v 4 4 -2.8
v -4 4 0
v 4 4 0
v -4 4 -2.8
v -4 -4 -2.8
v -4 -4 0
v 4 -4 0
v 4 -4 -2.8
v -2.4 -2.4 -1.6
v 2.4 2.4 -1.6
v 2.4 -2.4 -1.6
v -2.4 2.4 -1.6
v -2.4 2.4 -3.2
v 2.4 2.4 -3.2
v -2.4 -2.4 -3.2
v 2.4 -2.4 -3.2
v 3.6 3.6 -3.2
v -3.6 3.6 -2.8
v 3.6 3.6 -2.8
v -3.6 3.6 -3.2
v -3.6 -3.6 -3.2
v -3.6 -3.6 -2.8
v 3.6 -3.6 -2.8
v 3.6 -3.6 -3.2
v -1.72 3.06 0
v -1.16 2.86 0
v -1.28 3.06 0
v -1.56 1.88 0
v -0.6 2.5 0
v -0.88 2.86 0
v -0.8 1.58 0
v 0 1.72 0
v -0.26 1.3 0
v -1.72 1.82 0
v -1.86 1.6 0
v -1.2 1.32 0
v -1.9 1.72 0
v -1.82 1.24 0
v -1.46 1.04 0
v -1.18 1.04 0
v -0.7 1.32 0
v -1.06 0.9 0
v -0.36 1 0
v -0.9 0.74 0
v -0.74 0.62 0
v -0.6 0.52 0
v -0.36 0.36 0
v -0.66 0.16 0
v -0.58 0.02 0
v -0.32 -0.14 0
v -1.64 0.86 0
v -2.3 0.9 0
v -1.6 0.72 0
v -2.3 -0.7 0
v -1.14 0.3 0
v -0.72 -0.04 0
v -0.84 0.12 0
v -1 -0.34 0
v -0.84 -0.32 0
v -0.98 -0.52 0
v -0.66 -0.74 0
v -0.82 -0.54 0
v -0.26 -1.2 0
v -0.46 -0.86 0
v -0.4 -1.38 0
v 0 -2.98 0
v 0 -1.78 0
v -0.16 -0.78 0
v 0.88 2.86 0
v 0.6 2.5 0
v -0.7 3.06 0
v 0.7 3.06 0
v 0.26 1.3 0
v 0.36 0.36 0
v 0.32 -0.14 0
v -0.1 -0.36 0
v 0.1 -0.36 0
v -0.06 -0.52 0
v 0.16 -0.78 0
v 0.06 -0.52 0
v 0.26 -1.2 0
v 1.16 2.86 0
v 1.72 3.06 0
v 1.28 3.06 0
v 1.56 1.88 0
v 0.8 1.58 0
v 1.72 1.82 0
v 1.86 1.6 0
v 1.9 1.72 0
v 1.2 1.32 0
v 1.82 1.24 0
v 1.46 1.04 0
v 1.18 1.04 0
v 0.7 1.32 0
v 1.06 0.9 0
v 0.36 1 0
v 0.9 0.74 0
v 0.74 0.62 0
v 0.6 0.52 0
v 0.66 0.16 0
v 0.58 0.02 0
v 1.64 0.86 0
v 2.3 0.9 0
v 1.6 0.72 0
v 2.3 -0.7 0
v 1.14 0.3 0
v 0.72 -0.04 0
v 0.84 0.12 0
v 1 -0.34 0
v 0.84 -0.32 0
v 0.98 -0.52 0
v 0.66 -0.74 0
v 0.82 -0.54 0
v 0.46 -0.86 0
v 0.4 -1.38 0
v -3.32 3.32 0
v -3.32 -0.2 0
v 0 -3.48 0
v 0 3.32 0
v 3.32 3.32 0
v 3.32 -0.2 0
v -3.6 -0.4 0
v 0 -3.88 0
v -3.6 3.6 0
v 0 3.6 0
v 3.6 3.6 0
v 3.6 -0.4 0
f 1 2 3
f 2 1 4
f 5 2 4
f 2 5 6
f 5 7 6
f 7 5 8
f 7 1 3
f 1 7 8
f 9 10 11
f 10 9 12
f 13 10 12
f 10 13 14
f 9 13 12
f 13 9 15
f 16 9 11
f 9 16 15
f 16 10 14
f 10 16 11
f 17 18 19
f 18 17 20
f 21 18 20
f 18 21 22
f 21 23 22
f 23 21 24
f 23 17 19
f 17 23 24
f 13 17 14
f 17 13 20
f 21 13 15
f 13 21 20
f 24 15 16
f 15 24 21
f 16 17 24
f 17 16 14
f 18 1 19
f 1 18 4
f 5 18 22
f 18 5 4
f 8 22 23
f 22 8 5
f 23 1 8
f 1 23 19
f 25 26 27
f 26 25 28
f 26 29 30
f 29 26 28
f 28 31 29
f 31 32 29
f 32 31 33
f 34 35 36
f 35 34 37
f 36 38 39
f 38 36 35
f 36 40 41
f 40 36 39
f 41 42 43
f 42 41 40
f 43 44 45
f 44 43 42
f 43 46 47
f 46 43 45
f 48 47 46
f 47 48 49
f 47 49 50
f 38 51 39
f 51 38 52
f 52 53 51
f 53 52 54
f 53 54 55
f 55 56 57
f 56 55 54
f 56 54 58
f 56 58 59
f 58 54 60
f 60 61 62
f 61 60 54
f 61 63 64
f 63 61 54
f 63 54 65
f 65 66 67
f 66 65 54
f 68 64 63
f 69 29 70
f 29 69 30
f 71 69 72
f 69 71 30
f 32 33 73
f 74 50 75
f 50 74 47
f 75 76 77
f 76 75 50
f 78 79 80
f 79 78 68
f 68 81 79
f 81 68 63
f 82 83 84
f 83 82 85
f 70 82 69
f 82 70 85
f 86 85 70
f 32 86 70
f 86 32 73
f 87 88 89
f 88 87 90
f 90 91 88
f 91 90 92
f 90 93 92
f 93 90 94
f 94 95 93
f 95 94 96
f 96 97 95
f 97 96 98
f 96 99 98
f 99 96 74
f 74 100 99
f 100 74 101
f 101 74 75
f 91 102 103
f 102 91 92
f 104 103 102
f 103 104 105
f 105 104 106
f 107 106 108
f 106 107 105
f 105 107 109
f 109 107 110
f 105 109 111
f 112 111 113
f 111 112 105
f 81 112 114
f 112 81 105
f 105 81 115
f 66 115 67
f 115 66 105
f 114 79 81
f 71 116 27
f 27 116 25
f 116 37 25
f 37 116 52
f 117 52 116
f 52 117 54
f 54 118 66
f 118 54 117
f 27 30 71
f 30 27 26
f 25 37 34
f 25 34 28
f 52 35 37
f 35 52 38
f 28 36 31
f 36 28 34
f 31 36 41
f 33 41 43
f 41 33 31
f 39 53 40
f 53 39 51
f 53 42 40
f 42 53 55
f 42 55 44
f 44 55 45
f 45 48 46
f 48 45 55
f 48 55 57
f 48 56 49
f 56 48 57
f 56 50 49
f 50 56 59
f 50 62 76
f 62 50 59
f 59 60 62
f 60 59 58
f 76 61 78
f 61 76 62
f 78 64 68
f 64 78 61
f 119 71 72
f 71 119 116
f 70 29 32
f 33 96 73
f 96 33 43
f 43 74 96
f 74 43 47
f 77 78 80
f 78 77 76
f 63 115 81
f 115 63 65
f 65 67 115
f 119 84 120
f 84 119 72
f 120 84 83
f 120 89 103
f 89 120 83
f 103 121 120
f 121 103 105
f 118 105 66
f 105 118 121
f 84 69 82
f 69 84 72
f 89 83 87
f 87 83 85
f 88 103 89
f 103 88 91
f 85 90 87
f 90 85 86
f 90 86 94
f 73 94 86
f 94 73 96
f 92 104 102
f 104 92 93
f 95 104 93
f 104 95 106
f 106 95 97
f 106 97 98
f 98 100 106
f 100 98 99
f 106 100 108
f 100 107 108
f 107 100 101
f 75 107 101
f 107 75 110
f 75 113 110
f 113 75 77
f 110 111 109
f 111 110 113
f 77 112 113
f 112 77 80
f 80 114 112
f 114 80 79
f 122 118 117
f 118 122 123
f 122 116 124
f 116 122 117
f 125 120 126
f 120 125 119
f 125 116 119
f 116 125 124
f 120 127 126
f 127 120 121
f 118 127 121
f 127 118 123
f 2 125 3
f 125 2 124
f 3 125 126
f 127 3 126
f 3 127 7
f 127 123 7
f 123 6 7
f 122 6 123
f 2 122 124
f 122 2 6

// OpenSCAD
// file: ../p/box5.scad
use <../lib.scad>
function ldraw_lib__box5() = [
// 0 Box with 5 Faces and All Edges
// 0 Name: box5.dat
// 0 Author: James Jessiman
// 0 !LDRAW_ORG Primitive UPDATE 2012-01
// 0 !LICENSE Licensed under CC BY 2.0 and CC BY 4.0 : see CAreadme.txt
// 
// 0 BFC CERTIFY CCW
  [0,"BFC","CERTIFY"],
  [0,"BFC","CCW"],
// 
// 0 !HISTORY 2002-04-03 [sbliss] Modified for BFC compliance
// 0 !HISTORY 2002-04-25 [PTadmin] Official Update 2002-02
// 0 !HISTORY 2007-06-24 [PTadmin] Header formatted for Contributor Agreement
// 0 !HISTORY 2008-07-01 [PTadmin] Official Update 2008-01
// 0 !HISTORY 2012-02-16 [Philo] Changed to CCW
// 0 !HISTORY 2012-03-30 [PTadmin] Official Update 2012-01
// 
// 
// 2 24 1 1 1 -1 1 1
  [2,24,1,1,1,-1,1,1],
// 2 24 -1 1 1 -1 1 -1
  [2,24,-1,1,1,-1,1,-1],
// 2 24 -1 1 -1 1 1 -1
  [2,24,-1,1,-1,1,1,-1],
// 2 24 1 1 -1 1 1 1
  [2,24,1,1,-1,1,1,1],
// 2 24 1 0 1 -1 0 1
  [2,24,1,0,1,-1,0,1],
// 2 24 -1 0 1 -1 0 -1
  [2,24,-1,0,1,-1,0,-1],
// 2 24 -1 0 -1 1 0 -1
  [2,24,-1,0,-1,1,0,-1],
// 2 24 1 0 -1 1 0 1
  [2,24,1,0,-1,1,0,1],
// 2 24 1 0 1 1 1 1
  [2,24,1,0,1,1,1,1],
// 2 24 -1 0 1 -1 1 1
  [2,24,-1,0,1,-1,1,1],
// 2 24 1 0 -1 1 1 -1
  [2,24,1,0,-1,1,1,-1],
// 2 24 -1 0 -1 -1 1 -1
  [2,24,-1,0,-1,-1,1,-1],
// 4 16 -1 1 1 1 1 1 1 1 -1 -1 1 -1
  [4,16,-1,1,1,1,1,1,1,1,-1,-1,1,-1],
// 4 16 -1 1 1 -1 0 1 1 0 1 1 1 1
  [4,16,-1,1,1,-1,0,1,1,0,1,1,1,1],
// 4 16 -1 1 -1 -1 0 -1 -1 0 1 -1 1 1
  [4,16,-1,1,-1,-1,0,-1,-1,0,1,-1,1,1],
// 4 16 1 1 -1 1 0 -1 -1 0 -1 -1 1 -1
  [4,16,1,1,-1,1,0,-1,-1,0,-1,-1,1,-1],
// 4 16 1 1 1 1 0 1 1 0 -1 1 1 -1
  [4,16,1,1,1,1,0,1,1,0,-1,1,1,-1],
];
module ldraw_lib__box5(step=0, col=false, unit=2/5, alt=false, line=0.2, solid=!$preview)
    makepoly(ldraw_lib__box5(), step=step, col=col, unit=unit, alt=alt, line=line, solid=solid);
ldraw_lib__box5(line=0.2);
// file: ../p/box4.scad
use <../lib.scad>
function ldraw_lib__box4() = [
// 0 Box with 4 Faces (2 Parallel Pairs) and All Edges
// 0 Name: box4.dat
// 0 Author: James Jessiman
// 0 !LDRAW_ORG Primitive UPDATE 2012-01
// 0 !LICENSE Licensed under CC BY 2.0 and CC BY 4.0 : see CAreadme.txt
// 
// 0 BFC CERTIFY CCW
  [0,"BFC","CERTIFY"],
  [0,"BFC","CCW"],
// 
// 0 !HISTORY 2002-04-03 [sbliss] Modified for BFC compliance
// 0 !HISTORY 2002-04-25 [PTadmin] Official Update 2002-02
// 0 !HISTORY 2007-06-24 [PTadmin] Header formatted for Contributor Agreement
// 0 !HISTORY 2008-07-01 [PTadmin] Official Update 2008-01
// 0 !HISTORY 2012-02-16 [Philo] Changed to CCW
// 0 !HISTORY 2012-03-30 [PTadmin] Official Update 2012-01
// 
// 
// 2 24 1 1 1 -1 1 1
  [2,24,1,1,1,-1,1,1],
// 2 24 -1 1 1 -1 1 -1
  [2,24,-1,1,1,-1,1,-1],
// 2 24 -1 1 -1 1 1 -1
  [2,24,-1,1,-1,1,1,-1],
// 2 24 1 1 -1 1 1 1
  [2,24,1,1,-1,1,1,1],
// 2 24 1 0 1 -1 0 1
  [2,24,1,0,1,-1,0,1],
// 2 24 -1 0 1 -1 0 -1
  [2,24,-1,0,1,-1,0,-1],
// 2 24 -1 0 -1 1 0 -1
  [2,24,-1,0,-1,1,0,-1],
// 2 24 1 0 -1 1 0 1
  [2,24,1,0,-1,1,0,1],
// 2 24 1 0 1 1 1 1
  [2,24,1,0,1,1,1,1],
// 2 24 -1 0 1 -1 1 1
  [2,24,-1,0,1,-1,1,1],
// 2 24 1 0 -1 1 1 -1
  [2,24,1,0,-1,1,1,-1],
// 2 24 -1 0 -1 -1 1 -1
  [2,24,-1,0,-1,-1,1,-1],
// 4 16 -1 1 1 -1 0 1 1 0 1 1 1 1
  [4,16,-1,1,1,-1,0,1,1,0,1,1,1,1],
// 4 16 -1 1 -1 -1 0 -1 -1 0 1 -1 1 1
  [4,16,-1,1,-1,-1,0,-1,-1,0,1,-1,1,1],
// 4 16 1 1 -1 1 0 -1 -1 0 -1 -1 1 -1
  [4,16,1,1,-1,1,0,-1,-1,0,-1,-1,1,-1],
// 4 16 1 1 1 1 0 1 1 0 -1 1 1 -1
  [4,16,1,1,1,1,0,1,1,0,-1,1,1,-1],
];
module ldraw_lib__box4(step=0, col=false, unit=2/5, alt=false, line=0.2, solid=!$preview)
    makepoly(ldraw_lib__box4(), step=step, col=col, unit=unit, alt=alt, line=line, solid=solid);
ldraw_lib__box4(line=0.2);
// file: s/3070bs01.scad
use <../../lib.scad>
use <../../p/box4.scad>
use <../../p/box5.scad>
function ldraw_lib__s__3070bs01() = [
// 0 ~Tile  1 x  1 with Groove without Top Face
// 0 Name: s\3070bs01.dat
// 0 Author: Chris Dee [cwdee]
// 0 !LDRAW_ORG Subpart UPDATE 2009-02
// 0 !LICENSE Licensed under CC BY 2.0 and CC BY 4.0 : see CAreadme.txt
// 
// 0 BFC CERTIFY CCW
  [0,"BFC","CERTIFY"],
  [0,"BFC","CCW"],
// 
// 0 !HISTORY 2009-09-03 [PTadmin] Official Update 2009-02
// 
// 
// 1 16 0 0 0 10 0 0 0 7 0 0 0 10 box4.dat
  [1,16,0,0,0,10,0,0,0,7,0,0,0,10, ldraw_lib__box4()],
// 0 BFC INVERTNEXT
  [0,"BFC","INVERTNEXT"],
// 1 16 0 8 0 6 0 0 0 -4 0 0 0 6 box5.dat
  [1,16,0,8,0,6,0,0,0,-4,0,0,0,6, ldraw_lib__box5()],
// 1 16 0 7 0 9 0 0 0 1 0 0 0 9 box4.dat
  [1,16,0,7,0,9,0,0,0,1,0,0,0,9, ldraw_lib__box4()],
// 
// 4 16 9 8 9 6 8 6 -6 8 6 -9 8 9
  [4,16,9,8,9,6,8,6,-6,8,6,-9,8,9],
// 4 16 -9 8 9 -6 8 6 -6 8 -6 -9 8 -9
  [4,16,-9,8,9,-6,8,6,-6,8,-6,-9,8,-9],
// 4 16 -9 8 -9 -6 8 -6 6 8 -6 9 8 -9
  [4,16,-9,8,-9,-6,8,-6,6,8,-6,9,8,-9],
// 4 16 9 8 -9 6 8 -6 6 8 6 9 8 9
  [4,16,9,8,-9,6,8,-6,6,8,6,9,8,9],
// 
// 4 16 10 7 10 9 7 9 -9 7 9 -10 7 10
  [4,16,10,7,10,9,7,9,-9,7,9,-10,7,10],
// 4 16 -10 7 10 -9 7 9 -9 7 -9 -10 7 -10
  [4,16,-10,7,10,-9,7,9,-9,7,-9,-10,7,-10],
// 4 16 -10 7 -10 -9 7 -9 9 7 -9 10 7 -10
  [4,16,-10,7,-10,-9,7,-9,9,7,-9,10,7,-10],
// 4 16 10 7 -10 9 7 -9 9 7 9 10 7 10
  [4,16,10,7,-10,9,7,-9,9,7,9,10,7,10],
// 0
];
module ldraw_lib__s__3070bs01(step=0, col=false, unit=2/5, alt=false, line=0.2, solid=!$preview)
    makepoly(ldraw_lib__s__3070bs01(), step=step, col=col, unit=unit, alt=alt, line=line, solid=solid);
ldraw_lib__s__3070bs01(line=0.2);
// file: s/3070bpe0s02.scad
use <../../lib.scad>
function ldraw_lib__s__3070bpe0s02() = [
// 0 ~Pentagonal Shield Frame
// 0 Name: s\3070bpe0s02.dat
// 0 Author: Johann Eisner [technicbasics]
// 0 !LDRAW_ORG Subpart UPDATE 2019-03
// 0 !LICENSE Licensed under CC BY 2.0 and CC BY 4.0 : see CAreadme.txt
// 
// 0 BFC CERTIFY CCW
  [0,"BFC","CERTIFY"],
  [0,"BFC","CCW"],
// 
// 0 !HISTORY 2019-12-27 [PTadmin] Official Update 2019-03
// 
// 
// 4 0 -9 0 -1 0 0 -9.7 0 0 -8.7 -8.3 0 -0.5
  [4,0,-9,0,-1,0,0,-9.7,0,0,-8.7,-8.3,0,-0.5],
// 4 0 -9 0 9 -9 0 -1 -8.3 0 -.5 -8.3 0 8.3
  [4,0,-9,0,9,-9,0,-1,-8.3,0,-.5,-8.3,0,8.3],
// 4 0 9 0 9 0 0 9 0 0 8.3 8.3 0 8.3
  [4,0,9,0,9,0,0,9,0,0,8.3,8.3,0,8.3],
// 4 0 0 0 9 -9 0 9 -8.3 0 8.3 0 0 8.3
  [4,0,0,0,9,-9,0,9,-8.3,0,8.3,0,0,8.3],
// 4 0 9 0 9 8.3 0 8.3 8.3 0 -.5 9 0 -1
  [4,0,9,0,9,8.3,0,8.3,8.3,0,-.5,9,0,-1],
// 4 0 9 0 -1 8.3 0 -0.5 0 0 -8.7 0 0 -9.7
  [4,0,9,0,-1,8.3,0,-0.5,0,0,-8.7,0,0,-9.7],
// 4 16 -10 0 10 -9 0 9 0 0 9 10 0 10
  [4,16,-10,0,10,-9,0,9,0,0,9,10,0,10],
// 3 16 10 0 10 0 0 9 9 0 9
  [3,16,10,0,10,0,0,9,9,0,9],
// 4 16 10 0 10 9 0 9 9 0 -1 10 0 -10
  [4,16,10,0,10,9,0,9,9,0,-1,10,0,-10],
// 3 16 9 0 -1 0 0 -9.7 10 0 -10
  [3,16,9,0,-1,0,0,-9.7,10,0,-10],
// 3 16 0 0 -9.7 -10 0 -10 10 0 -10
  [3,16,0,0,-9.7,-10,0,-10,10,0,-10],
// 3 16 -9 0 -1 -10 0 -10 0 0 -9.7
  [3,16,-9,0,-1,-10,0,-10,0,0,-9.7],
// 4 16 -10 0 10 -10 0 -10 -9 0 -1 -9 0 9
  [4,16,-10,0,10,-10,0,-10,-9,0,-1,-9,0,9],
];
module ldraw_lib__s__3070bpe0s02(step=0, col=false, unit=2/5, alt=false, line=0.2, solid=!$preview)
    makepoly(ldraw_lib__s__3070bpe0s02(), step=step, col=col, unit=unit, alt=alt, line=line, solid=solid);
ldraw_lib__s__3070bpe0s02(line=0.2);
// main file
use <../lib.scad>
use <s/3070bpe0s02.scad>
use <s/3070bpe1s01.scad>
use <s/3070bs01.scad>
function ldraw_lib__3070bpe1() = [
// 0 Tile  1 x  1 with Yellow King Symbol on Orange Pentagonal Shield Pattern
// 0 Name: 3070bpe1.dat
// 0 Author: Vincent Messenet [Cheenzo]
// 0 !LDRAW_ORG Part UPDATE 2019-03
// 0 !LICENSE Licensed under CC BY 2.0 and CC BY 4.0 : see CAreadme.txt
// 
// 0 BFC CERTIFY CCW
  [0,"BFC","CERTIFY"],
  [0,"BFC","CCW"],
// 
// 0 !KEYWORDS BrickLink 3070bpb097, Nexo Knights
// 
// 0 !HISTORY 2019-12-27 [PTadmin] Official Update 2019-03
// 
// 
// 1 16 0 0 0 1 0 0 0 1 0 0 0 1 s\3070bs01.dat
  [1,16,0,0,0,1,0,0,0,1,0,0,0,1, ldraw_lib__s__3070bs01()],
// 1 16 0 0 0 1 0 0 0 1 0 0 0 1 s\3070bpe1s01.dat
  [1,16,0,0,0,1,0,0,0,1,0,0,0,1, ldraw_lib__s__3070bpe1s01()],
// 1 16 0 0 0 1 0 0 0 1 0 0 0 1 s\3070bpe0s02.dat
  [1,16,0,0,0,1,0,0,0,1,0,0,0,1, ldraw_lib__s__3070bpe0s02()],
];
module ldraw_lib__3070bpe1(step=0, col=false, unit=2/5, alt=false, line=0.2, solid=!$preview)
    makepoly(ldraw_lib__3070bpe1(), step=step, col=col, unit=unit, alt=alt, line=line, solid=solid);
ldraw_lib__3070bpe1(line=0.2);
